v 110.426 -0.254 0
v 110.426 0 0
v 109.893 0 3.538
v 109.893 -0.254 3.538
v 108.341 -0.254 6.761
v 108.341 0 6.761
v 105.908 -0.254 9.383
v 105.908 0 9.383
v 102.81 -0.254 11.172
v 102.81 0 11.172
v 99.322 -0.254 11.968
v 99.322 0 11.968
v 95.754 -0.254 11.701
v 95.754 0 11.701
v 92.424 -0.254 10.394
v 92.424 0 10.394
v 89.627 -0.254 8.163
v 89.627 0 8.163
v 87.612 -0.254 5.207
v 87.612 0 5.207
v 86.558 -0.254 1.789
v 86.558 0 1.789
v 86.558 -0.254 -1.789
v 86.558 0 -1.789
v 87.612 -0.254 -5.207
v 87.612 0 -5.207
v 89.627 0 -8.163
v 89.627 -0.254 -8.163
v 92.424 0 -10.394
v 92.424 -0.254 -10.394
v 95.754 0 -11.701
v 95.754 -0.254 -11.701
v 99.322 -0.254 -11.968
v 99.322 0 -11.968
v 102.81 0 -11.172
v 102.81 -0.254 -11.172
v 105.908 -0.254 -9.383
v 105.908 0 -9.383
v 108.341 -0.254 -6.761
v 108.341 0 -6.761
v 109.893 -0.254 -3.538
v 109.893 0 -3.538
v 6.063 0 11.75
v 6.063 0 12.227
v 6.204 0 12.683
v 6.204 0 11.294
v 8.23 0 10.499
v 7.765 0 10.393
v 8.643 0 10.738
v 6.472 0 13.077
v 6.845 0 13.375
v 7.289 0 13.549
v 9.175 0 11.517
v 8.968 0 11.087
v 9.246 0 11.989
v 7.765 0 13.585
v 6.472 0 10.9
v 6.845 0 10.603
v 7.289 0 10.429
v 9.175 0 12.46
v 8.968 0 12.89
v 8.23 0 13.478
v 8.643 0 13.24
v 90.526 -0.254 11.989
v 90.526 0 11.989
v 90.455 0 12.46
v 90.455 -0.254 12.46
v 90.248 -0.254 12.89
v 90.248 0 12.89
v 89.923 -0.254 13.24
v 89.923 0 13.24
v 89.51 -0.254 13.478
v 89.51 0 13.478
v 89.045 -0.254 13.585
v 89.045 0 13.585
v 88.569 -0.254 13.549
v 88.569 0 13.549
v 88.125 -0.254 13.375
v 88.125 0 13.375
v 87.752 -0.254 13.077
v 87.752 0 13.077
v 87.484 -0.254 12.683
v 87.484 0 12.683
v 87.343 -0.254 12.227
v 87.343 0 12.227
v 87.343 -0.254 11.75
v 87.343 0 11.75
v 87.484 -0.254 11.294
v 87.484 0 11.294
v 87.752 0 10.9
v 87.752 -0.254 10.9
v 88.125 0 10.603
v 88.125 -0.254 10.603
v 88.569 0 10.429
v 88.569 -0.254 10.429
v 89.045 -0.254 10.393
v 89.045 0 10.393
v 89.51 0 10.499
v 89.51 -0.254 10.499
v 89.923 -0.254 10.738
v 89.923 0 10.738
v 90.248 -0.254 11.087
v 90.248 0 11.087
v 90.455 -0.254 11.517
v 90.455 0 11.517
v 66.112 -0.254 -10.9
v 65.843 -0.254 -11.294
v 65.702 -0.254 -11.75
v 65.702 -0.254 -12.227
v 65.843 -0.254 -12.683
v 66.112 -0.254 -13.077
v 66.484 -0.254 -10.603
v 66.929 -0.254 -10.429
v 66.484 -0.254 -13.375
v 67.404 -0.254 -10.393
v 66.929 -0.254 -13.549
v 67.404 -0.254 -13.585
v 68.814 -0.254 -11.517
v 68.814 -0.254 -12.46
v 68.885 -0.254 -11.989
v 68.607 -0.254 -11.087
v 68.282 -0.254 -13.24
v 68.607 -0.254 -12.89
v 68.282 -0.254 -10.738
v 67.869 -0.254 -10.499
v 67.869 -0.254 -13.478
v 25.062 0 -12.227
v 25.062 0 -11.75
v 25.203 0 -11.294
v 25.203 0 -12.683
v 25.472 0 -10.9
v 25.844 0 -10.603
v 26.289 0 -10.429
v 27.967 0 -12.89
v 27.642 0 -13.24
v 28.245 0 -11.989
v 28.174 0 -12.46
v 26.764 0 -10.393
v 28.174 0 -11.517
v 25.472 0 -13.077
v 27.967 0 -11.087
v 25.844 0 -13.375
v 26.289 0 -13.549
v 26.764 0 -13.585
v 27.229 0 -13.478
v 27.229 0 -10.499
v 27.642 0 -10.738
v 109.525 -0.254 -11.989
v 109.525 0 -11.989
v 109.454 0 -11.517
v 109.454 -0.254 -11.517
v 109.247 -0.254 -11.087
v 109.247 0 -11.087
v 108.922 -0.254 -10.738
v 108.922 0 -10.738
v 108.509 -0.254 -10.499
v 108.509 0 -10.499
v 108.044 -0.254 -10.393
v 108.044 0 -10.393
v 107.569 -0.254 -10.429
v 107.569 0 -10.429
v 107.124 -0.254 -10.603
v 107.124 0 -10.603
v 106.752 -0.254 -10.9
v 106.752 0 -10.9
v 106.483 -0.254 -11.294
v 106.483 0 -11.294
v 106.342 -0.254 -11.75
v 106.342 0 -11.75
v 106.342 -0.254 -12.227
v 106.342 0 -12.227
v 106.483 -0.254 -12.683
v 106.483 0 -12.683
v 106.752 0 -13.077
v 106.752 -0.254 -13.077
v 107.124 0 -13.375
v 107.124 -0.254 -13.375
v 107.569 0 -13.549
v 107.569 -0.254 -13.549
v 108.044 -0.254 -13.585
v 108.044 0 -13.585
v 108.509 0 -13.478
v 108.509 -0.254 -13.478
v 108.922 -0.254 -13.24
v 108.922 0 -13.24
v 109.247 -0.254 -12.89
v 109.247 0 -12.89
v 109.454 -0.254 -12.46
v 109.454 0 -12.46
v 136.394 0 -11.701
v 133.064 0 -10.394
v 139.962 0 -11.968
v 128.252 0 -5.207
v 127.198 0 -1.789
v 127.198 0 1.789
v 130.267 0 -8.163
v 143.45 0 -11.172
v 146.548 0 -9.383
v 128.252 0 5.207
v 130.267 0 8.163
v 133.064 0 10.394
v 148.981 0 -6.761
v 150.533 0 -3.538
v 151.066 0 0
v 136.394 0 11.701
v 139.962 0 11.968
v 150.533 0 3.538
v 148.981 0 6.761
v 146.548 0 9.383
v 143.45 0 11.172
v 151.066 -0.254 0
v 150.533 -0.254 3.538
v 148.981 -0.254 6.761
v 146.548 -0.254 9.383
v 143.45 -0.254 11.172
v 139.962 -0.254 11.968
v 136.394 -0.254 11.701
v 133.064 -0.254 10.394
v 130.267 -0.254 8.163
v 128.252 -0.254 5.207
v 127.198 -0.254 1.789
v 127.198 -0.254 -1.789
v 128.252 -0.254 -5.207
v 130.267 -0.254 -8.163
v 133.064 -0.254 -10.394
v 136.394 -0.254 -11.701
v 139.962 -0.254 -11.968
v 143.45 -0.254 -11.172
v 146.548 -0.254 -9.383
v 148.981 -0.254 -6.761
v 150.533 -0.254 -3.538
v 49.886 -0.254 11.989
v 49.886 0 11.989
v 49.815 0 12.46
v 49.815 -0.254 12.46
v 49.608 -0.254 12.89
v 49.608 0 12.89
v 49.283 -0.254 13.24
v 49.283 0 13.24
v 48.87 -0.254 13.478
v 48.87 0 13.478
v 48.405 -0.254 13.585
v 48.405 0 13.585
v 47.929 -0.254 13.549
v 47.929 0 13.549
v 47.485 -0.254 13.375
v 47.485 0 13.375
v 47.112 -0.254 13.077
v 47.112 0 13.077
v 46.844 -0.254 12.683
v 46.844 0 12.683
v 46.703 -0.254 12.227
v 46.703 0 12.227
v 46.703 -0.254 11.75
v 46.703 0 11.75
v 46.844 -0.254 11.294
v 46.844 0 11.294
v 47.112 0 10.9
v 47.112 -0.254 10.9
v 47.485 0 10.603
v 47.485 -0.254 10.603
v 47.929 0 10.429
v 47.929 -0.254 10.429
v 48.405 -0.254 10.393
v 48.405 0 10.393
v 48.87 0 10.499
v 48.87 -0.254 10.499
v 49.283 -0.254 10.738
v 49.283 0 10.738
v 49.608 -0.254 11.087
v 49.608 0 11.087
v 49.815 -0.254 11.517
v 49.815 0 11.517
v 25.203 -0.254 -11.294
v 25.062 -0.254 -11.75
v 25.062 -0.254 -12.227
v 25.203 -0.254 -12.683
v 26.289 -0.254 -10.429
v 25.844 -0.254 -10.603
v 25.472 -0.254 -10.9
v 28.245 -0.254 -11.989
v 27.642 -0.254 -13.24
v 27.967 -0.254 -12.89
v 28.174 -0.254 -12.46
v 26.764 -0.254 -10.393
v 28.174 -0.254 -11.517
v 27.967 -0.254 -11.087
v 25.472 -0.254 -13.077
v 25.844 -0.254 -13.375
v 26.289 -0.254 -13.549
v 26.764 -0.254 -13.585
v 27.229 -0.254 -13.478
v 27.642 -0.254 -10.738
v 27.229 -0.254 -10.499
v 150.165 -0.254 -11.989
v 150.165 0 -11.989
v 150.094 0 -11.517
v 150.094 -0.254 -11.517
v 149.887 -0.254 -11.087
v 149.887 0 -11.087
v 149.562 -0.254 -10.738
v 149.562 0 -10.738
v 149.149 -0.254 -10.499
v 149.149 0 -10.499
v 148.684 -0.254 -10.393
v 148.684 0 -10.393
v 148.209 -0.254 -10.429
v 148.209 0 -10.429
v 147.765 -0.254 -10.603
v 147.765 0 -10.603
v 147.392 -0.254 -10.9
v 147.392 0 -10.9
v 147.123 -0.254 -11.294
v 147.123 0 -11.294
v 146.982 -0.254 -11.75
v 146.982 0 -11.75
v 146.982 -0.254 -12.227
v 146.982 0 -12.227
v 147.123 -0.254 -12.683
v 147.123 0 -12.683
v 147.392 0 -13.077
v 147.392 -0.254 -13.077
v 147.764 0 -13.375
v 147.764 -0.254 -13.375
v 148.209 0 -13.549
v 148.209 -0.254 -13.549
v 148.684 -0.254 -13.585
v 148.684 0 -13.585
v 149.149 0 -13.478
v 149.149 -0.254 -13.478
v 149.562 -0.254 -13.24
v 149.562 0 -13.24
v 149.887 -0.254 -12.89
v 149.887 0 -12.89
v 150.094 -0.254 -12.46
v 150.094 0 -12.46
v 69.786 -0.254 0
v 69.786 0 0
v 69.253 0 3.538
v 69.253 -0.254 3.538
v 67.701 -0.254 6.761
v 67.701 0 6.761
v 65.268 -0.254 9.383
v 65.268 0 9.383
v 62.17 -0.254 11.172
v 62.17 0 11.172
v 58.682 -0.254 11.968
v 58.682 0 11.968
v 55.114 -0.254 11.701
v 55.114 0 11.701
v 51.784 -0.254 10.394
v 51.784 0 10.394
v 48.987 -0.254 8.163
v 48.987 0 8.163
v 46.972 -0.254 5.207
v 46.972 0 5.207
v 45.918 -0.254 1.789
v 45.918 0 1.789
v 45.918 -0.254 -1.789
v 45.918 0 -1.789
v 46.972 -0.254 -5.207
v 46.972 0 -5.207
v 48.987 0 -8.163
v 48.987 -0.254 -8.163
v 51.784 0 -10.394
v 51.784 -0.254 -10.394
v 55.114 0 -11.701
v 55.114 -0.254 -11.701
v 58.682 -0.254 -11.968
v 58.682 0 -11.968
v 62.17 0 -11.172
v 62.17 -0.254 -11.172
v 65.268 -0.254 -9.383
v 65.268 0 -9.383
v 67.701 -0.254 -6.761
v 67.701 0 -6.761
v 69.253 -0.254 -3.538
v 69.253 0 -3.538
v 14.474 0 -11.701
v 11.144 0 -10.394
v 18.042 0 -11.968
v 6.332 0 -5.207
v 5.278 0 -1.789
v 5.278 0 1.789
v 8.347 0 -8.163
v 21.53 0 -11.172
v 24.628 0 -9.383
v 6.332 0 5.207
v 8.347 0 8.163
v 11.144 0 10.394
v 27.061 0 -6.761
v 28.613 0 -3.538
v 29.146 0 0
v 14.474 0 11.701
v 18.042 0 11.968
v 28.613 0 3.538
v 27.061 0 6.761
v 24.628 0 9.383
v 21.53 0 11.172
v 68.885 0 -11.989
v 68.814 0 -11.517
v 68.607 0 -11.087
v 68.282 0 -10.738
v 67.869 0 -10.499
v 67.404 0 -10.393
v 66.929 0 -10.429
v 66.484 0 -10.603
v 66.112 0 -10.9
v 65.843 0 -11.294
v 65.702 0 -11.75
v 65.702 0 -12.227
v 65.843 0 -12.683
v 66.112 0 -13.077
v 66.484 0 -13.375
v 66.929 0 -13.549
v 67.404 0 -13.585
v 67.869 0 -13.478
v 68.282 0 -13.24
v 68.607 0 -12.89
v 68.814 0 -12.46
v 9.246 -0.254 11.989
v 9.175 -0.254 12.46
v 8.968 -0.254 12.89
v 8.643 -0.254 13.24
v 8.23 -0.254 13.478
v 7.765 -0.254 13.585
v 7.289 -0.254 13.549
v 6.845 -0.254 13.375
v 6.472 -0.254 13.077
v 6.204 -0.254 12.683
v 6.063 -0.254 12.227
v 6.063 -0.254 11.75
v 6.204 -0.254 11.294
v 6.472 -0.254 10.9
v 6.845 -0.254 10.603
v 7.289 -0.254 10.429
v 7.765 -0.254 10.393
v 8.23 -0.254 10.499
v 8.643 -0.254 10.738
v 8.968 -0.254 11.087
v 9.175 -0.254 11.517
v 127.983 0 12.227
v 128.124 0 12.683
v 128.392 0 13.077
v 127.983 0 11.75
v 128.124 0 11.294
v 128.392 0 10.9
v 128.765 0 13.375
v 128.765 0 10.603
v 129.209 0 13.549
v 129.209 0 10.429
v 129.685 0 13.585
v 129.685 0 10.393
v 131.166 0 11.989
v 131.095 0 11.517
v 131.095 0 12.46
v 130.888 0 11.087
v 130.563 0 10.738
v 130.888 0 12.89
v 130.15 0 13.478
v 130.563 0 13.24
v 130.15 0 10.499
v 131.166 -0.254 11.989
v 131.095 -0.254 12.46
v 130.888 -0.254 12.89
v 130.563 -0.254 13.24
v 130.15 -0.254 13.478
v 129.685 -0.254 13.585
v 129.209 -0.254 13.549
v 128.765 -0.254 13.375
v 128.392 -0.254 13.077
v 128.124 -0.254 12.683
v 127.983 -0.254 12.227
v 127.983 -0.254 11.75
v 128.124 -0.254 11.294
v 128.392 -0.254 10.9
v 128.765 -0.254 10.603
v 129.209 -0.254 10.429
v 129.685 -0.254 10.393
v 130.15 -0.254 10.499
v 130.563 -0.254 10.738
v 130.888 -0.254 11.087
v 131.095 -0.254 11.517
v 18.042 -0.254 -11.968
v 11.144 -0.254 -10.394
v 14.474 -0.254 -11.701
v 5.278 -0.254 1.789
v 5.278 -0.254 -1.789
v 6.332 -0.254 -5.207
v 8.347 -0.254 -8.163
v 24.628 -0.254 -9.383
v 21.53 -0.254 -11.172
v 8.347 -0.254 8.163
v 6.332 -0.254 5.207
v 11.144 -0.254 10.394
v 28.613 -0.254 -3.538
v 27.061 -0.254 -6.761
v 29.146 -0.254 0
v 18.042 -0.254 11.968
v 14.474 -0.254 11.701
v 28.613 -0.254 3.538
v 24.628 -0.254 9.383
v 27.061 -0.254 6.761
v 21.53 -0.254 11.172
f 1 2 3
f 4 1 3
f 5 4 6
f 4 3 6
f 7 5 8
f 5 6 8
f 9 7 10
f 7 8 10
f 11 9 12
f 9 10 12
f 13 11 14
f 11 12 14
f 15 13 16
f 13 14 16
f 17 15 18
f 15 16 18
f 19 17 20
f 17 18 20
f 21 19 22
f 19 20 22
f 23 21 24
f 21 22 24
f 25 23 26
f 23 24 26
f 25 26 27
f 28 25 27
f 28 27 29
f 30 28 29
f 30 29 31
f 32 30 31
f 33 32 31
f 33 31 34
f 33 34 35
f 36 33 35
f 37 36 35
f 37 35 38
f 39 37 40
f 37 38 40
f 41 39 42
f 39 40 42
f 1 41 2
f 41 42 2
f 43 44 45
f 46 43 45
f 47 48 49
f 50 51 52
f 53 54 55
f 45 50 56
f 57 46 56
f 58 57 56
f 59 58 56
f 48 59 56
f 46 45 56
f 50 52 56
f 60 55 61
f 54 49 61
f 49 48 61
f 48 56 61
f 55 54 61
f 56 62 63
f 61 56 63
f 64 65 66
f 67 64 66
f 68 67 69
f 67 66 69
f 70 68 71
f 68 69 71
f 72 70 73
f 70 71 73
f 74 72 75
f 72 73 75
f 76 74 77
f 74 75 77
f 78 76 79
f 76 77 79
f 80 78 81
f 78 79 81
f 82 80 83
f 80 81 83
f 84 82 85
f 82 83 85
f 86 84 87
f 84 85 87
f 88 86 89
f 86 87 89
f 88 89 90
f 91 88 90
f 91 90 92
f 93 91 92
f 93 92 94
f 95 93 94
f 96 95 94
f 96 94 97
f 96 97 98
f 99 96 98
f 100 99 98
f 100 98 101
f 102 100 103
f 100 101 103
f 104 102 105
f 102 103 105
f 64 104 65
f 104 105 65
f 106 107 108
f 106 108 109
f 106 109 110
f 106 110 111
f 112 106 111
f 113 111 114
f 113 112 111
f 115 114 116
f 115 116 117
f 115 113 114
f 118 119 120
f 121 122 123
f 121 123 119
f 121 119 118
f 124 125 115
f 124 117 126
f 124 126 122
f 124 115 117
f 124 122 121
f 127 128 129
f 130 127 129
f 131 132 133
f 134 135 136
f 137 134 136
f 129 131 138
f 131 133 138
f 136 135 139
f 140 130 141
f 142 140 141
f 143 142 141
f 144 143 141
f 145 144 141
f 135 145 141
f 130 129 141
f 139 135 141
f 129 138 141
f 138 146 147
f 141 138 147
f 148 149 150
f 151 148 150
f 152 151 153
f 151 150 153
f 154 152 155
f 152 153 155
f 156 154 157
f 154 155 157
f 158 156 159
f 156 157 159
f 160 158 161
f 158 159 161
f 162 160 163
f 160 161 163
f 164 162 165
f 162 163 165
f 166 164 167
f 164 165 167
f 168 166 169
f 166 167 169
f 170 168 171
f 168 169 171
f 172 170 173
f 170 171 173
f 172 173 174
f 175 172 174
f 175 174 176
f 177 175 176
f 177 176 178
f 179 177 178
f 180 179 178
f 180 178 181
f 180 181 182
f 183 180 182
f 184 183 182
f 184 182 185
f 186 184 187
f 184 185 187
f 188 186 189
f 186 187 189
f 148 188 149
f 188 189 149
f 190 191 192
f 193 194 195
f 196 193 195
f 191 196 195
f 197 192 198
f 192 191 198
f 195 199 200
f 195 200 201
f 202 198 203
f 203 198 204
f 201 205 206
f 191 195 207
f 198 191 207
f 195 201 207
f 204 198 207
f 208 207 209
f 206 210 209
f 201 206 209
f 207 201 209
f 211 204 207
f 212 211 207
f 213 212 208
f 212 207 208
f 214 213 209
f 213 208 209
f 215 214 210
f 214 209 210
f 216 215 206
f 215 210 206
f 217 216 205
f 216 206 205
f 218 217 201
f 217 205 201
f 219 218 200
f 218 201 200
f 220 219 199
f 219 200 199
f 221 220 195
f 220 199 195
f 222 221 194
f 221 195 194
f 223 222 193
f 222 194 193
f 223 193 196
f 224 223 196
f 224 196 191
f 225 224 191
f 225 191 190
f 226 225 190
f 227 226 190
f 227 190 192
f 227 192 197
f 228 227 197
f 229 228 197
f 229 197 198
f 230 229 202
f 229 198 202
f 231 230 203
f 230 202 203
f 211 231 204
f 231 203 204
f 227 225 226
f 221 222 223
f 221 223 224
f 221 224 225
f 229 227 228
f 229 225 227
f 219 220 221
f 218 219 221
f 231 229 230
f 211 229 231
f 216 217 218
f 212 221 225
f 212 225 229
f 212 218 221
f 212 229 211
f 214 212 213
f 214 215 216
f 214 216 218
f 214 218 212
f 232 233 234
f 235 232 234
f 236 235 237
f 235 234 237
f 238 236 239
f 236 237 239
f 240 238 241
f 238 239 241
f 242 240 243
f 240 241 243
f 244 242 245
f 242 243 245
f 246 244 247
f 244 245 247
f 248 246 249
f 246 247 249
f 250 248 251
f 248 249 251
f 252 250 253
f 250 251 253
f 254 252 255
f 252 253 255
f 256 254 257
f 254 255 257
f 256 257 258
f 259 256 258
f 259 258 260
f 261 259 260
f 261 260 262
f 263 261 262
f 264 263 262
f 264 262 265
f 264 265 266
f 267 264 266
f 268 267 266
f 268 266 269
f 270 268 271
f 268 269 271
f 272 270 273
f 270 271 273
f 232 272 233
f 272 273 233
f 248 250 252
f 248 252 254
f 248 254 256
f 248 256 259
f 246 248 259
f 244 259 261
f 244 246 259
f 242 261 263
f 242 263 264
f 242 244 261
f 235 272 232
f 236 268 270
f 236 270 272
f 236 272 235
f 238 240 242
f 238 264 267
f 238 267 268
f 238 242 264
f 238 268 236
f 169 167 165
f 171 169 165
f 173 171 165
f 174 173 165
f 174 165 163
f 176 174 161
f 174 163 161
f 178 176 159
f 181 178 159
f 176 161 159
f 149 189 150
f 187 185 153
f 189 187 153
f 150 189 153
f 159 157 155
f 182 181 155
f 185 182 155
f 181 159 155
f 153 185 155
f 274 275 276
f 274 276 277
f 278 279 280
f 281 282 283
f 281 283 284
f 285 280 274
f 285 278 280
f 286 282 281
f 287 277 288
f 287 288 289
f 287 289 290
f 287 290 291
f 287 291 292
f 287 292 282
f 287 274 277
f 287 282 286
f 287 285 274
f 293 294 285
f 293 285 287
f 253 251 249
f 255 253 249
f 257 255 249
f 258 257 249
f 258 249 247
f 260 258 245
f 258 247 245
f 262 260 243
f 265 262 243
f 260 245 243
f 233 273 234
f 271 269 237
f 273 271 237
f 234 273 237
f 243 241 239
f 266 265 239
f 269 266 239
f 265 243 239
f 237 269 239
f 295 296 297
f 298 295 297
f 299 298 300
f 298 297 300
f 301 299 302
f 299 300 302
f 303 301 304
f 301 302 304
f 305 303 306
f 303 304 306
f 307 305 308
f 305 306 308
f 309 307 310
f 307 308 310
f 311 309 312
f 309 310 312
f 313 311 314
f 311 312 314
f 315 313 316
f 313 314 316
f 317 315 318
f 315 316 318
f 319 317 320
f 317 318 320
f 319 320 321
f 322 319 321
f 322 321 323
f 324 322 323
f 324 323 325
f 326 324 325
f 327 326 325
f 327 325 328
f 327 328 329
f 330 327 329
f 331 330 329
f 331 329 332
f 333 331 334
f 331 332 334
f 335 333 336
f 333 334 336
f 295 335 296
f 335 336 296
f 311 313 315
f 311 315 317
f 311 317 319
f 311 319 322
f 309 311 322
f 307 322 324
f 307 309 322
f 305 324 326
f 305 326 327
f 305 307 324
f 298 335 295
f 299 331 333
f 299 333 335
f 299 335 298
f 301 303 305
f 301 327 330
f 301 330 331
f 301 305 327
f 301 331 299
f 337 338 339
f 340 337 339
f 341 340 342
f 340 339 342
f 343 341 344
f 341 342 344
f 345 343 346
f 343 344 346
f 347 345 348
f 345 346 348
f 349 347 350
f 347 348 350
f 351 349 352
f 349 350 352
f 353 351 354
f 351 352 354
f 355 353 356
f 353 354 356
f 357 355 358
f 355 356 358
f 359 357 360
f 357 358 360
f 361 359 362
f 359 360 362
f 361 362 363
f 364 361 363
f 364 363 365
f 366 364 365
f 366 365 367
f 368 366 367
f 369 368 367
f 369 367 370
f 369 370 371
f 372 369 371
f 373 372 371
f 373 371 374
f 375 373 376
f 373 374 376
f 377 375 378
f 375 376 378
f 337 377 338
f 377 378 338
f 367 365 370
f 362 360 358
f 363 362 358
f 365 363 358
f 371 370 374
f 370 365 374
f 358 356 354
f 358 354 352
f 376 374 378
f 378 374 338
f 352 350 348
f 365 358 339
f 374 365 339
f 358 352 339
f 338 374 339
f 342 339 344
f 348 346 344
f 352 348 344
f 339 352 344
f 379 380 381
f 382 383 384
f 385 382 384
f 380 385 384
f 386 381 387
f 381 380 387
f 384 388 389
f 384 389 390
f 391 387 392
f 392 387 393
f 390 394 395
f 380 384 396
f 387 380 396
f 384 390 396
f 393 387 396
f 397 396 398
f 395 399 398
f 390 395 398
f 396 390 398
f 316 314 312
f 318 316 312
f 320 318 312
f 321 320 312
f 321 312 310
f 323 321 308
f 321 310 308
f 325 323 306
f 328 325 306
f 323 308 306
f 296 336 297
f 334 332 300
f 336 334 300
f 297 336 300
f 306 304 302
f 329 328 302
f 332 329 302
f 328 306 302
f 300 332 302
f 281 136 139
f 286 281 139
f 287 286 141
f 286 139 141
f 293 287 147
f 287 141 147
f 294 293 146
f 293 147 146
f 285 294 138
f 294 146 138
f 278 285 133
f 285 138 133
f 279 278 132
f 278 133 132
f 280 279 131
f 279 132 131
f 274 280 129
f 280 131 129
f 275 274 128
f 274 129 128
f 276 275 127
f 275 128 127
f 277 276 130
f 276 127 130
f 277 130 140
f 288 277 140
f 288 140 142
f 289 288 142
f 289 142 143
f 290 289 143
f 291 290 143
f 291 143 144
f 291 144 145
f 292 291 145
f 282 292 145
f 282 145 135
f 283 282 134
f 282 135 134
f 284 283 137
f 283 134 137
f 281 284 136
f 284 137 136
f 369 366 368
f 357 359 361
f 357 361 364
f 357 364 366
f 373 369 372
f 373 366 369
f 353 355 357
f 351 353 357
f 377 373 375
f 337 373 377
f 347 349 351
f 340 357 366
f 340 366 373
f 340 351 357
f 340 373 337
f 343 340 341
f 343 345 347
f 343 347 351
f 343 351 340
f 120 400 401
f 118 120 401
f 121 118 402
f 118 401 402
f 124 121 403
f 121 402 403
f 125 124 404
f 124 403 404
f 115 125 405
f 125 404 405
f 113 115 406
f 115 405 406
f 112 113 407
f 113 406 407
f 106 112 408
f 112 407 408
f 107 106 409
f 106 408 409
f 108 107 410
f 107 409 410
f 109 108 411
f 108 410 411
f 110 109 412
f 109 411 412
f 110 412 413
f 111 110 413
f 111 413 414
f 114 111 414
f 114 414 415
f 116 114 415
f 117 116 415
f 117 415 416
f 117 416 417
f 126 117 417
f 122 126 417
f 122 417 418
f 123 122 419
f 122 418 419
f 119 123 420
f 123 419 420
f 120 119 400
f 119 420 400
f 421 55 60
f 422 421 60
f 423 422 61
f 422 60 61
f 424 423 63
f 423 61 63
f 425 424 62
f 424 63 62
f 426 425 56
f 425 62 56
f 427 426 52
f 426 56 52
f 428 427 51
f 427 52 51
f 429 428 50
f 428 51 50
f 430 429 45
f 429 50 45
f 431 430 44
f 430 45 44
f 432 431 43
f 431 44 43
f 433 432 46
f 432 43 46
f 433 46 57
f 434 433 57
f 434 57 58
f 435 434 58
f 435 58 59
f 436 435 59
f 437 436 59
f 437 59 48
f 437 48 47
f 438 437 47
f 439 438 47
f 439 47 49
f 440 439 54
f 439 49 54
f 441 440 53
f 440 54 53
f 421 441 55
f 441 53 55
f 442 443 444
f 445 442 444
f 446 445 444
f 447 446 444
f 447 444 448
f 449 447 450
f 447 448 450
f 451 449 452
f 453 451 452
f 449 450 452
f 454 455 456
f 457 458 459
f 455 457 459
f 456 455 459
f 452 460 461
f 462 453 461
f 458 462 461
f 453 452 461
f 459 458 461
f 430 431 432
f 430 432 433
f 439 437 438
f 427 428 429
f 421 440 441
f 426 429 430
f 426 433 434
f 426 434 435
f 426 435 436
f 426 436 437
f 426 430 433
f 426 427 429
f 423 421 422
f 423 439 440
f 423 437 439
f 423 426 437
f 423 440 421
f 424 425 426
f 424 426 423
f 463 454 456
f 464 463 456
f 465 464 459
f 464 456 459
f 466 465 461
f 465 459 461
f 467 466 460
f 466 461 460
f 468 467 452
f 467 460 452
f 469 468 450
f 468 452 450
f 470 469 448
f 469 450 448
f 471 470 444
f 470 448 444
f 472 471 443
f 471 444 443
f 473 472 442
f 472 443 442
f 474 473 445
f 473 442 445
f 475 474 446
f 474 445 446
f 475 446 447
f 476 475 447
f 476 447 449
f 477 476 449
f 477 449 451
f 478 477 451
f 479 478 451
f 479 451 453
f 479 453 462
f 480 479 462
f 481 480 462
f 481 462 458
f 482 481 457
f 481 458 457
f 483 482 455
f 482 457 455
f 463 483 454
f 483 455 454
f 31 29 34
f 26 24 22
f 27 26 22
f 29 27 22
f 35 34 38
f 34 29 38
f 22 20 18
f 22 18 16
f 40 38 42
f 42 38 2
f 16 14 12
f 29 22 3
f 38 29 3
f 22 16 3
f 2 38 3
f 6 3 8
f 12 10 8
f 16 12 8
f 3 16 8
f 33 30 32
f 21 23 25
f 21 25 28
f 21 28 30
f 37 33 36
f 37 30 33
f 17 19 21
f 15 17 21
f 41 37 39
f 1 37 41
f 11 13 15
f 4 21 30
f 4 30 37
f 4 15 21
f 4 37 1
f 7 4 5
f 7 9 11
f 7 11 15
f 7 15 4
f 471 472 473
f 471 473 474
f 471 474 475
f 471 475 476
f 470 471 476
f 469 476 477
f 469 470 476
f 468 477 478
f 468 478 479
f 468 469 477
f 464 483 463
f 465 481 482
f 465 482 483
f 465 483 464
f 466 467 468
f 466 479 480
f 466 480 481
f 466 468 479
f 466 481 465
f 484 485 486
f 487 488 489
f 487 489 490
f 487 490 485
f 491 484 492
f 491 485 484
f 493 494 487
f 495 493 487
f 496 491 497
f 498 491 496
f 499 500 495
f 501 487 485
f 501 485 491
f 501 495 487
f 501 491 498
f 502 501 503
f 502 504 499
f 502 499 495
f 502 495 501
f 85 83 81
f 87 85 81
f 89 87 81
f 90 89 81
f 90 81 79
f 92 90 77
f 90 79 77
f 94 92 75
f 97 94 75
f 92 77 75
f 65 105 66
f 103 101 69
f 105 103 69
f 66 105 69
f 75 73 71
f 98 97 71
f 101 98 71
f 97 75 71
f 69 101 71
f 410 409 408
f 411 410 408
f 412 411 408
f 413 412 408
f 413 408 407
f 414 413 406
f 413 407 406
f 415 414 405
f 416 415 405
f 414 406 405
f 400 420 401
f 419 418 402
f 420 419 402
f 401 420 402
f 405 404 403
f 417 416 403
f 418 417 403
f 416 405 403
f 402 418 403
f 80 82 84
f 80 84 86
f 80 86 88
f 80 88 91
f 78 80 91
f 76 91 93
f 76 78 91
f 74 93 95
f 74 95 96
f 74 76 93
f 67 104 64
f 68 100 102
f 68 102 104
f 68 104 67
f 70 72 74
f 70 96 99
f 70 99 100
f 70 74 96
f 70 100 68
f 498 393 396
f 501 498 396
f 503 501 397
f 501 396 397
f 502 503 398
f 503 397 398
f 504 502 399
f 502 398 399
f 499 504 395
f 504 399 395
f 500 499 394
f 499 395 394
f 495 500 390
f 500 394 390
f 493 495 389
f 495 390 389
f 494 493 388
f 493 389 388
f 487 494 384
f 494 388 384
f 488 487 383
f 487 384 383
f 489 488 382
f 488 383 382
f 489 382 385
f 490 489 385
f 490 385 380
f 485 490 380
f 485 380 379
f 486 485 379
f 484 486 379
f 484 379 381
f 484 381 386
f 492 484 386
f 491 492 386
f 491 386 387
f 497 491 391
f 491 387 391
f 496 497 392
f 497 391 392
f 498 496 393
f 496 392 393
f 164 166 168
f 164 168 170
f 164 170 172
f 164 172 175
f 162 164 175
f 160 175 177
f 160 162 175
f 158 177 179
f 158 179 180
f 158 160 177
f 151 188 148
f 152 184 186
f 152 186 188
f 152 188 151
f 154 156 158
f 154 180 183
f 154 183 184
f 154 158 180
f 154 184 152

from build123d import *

# Parameters (mm, degrees)
F0_R     = 12.0015
F0_R_2   = 1.6002
F1_DEPTH = 0.254


with BuildPart() as f1:
    # F0 (on Front) → F1 (new body)
    with BuildSketch(Plane.XZ):
        with Locations((17.145, 0)):
            Circle(F0_R)
        with Locations((7.6454, 11.9888)):
            Circle(F0_R_2)
        with Locations((26.6446, -11.9888)):
            Circle(F0_R_2)
        with Locations((57.785, 0)):
            Circle(F0_R)
        with Locations((48.2854, 11.9888)):
            Circle(F0_R_2)
        with Locations((67.2846, -11.9888)):
            Circle(F0_R_2)
        with Locations((98.425, 0)):
            Circle(F0_R)
        with Locations((88.9254, 11.9888)):
            Circle(F0_R_2)
        with Locations((107.9246, -11.9888)):
            Circle(F0_R_2)
        with Locations((139.065, 0)):
            Circle(F0_R)
        with Locations((129.5654, 11.9888)):
            Circle(F0_R_2)
        with Locations((148.5646, -11.9888)):
            Circle(F0_R_2)
    extrude(amount=F1_DEPTH)


solid = f1.part
